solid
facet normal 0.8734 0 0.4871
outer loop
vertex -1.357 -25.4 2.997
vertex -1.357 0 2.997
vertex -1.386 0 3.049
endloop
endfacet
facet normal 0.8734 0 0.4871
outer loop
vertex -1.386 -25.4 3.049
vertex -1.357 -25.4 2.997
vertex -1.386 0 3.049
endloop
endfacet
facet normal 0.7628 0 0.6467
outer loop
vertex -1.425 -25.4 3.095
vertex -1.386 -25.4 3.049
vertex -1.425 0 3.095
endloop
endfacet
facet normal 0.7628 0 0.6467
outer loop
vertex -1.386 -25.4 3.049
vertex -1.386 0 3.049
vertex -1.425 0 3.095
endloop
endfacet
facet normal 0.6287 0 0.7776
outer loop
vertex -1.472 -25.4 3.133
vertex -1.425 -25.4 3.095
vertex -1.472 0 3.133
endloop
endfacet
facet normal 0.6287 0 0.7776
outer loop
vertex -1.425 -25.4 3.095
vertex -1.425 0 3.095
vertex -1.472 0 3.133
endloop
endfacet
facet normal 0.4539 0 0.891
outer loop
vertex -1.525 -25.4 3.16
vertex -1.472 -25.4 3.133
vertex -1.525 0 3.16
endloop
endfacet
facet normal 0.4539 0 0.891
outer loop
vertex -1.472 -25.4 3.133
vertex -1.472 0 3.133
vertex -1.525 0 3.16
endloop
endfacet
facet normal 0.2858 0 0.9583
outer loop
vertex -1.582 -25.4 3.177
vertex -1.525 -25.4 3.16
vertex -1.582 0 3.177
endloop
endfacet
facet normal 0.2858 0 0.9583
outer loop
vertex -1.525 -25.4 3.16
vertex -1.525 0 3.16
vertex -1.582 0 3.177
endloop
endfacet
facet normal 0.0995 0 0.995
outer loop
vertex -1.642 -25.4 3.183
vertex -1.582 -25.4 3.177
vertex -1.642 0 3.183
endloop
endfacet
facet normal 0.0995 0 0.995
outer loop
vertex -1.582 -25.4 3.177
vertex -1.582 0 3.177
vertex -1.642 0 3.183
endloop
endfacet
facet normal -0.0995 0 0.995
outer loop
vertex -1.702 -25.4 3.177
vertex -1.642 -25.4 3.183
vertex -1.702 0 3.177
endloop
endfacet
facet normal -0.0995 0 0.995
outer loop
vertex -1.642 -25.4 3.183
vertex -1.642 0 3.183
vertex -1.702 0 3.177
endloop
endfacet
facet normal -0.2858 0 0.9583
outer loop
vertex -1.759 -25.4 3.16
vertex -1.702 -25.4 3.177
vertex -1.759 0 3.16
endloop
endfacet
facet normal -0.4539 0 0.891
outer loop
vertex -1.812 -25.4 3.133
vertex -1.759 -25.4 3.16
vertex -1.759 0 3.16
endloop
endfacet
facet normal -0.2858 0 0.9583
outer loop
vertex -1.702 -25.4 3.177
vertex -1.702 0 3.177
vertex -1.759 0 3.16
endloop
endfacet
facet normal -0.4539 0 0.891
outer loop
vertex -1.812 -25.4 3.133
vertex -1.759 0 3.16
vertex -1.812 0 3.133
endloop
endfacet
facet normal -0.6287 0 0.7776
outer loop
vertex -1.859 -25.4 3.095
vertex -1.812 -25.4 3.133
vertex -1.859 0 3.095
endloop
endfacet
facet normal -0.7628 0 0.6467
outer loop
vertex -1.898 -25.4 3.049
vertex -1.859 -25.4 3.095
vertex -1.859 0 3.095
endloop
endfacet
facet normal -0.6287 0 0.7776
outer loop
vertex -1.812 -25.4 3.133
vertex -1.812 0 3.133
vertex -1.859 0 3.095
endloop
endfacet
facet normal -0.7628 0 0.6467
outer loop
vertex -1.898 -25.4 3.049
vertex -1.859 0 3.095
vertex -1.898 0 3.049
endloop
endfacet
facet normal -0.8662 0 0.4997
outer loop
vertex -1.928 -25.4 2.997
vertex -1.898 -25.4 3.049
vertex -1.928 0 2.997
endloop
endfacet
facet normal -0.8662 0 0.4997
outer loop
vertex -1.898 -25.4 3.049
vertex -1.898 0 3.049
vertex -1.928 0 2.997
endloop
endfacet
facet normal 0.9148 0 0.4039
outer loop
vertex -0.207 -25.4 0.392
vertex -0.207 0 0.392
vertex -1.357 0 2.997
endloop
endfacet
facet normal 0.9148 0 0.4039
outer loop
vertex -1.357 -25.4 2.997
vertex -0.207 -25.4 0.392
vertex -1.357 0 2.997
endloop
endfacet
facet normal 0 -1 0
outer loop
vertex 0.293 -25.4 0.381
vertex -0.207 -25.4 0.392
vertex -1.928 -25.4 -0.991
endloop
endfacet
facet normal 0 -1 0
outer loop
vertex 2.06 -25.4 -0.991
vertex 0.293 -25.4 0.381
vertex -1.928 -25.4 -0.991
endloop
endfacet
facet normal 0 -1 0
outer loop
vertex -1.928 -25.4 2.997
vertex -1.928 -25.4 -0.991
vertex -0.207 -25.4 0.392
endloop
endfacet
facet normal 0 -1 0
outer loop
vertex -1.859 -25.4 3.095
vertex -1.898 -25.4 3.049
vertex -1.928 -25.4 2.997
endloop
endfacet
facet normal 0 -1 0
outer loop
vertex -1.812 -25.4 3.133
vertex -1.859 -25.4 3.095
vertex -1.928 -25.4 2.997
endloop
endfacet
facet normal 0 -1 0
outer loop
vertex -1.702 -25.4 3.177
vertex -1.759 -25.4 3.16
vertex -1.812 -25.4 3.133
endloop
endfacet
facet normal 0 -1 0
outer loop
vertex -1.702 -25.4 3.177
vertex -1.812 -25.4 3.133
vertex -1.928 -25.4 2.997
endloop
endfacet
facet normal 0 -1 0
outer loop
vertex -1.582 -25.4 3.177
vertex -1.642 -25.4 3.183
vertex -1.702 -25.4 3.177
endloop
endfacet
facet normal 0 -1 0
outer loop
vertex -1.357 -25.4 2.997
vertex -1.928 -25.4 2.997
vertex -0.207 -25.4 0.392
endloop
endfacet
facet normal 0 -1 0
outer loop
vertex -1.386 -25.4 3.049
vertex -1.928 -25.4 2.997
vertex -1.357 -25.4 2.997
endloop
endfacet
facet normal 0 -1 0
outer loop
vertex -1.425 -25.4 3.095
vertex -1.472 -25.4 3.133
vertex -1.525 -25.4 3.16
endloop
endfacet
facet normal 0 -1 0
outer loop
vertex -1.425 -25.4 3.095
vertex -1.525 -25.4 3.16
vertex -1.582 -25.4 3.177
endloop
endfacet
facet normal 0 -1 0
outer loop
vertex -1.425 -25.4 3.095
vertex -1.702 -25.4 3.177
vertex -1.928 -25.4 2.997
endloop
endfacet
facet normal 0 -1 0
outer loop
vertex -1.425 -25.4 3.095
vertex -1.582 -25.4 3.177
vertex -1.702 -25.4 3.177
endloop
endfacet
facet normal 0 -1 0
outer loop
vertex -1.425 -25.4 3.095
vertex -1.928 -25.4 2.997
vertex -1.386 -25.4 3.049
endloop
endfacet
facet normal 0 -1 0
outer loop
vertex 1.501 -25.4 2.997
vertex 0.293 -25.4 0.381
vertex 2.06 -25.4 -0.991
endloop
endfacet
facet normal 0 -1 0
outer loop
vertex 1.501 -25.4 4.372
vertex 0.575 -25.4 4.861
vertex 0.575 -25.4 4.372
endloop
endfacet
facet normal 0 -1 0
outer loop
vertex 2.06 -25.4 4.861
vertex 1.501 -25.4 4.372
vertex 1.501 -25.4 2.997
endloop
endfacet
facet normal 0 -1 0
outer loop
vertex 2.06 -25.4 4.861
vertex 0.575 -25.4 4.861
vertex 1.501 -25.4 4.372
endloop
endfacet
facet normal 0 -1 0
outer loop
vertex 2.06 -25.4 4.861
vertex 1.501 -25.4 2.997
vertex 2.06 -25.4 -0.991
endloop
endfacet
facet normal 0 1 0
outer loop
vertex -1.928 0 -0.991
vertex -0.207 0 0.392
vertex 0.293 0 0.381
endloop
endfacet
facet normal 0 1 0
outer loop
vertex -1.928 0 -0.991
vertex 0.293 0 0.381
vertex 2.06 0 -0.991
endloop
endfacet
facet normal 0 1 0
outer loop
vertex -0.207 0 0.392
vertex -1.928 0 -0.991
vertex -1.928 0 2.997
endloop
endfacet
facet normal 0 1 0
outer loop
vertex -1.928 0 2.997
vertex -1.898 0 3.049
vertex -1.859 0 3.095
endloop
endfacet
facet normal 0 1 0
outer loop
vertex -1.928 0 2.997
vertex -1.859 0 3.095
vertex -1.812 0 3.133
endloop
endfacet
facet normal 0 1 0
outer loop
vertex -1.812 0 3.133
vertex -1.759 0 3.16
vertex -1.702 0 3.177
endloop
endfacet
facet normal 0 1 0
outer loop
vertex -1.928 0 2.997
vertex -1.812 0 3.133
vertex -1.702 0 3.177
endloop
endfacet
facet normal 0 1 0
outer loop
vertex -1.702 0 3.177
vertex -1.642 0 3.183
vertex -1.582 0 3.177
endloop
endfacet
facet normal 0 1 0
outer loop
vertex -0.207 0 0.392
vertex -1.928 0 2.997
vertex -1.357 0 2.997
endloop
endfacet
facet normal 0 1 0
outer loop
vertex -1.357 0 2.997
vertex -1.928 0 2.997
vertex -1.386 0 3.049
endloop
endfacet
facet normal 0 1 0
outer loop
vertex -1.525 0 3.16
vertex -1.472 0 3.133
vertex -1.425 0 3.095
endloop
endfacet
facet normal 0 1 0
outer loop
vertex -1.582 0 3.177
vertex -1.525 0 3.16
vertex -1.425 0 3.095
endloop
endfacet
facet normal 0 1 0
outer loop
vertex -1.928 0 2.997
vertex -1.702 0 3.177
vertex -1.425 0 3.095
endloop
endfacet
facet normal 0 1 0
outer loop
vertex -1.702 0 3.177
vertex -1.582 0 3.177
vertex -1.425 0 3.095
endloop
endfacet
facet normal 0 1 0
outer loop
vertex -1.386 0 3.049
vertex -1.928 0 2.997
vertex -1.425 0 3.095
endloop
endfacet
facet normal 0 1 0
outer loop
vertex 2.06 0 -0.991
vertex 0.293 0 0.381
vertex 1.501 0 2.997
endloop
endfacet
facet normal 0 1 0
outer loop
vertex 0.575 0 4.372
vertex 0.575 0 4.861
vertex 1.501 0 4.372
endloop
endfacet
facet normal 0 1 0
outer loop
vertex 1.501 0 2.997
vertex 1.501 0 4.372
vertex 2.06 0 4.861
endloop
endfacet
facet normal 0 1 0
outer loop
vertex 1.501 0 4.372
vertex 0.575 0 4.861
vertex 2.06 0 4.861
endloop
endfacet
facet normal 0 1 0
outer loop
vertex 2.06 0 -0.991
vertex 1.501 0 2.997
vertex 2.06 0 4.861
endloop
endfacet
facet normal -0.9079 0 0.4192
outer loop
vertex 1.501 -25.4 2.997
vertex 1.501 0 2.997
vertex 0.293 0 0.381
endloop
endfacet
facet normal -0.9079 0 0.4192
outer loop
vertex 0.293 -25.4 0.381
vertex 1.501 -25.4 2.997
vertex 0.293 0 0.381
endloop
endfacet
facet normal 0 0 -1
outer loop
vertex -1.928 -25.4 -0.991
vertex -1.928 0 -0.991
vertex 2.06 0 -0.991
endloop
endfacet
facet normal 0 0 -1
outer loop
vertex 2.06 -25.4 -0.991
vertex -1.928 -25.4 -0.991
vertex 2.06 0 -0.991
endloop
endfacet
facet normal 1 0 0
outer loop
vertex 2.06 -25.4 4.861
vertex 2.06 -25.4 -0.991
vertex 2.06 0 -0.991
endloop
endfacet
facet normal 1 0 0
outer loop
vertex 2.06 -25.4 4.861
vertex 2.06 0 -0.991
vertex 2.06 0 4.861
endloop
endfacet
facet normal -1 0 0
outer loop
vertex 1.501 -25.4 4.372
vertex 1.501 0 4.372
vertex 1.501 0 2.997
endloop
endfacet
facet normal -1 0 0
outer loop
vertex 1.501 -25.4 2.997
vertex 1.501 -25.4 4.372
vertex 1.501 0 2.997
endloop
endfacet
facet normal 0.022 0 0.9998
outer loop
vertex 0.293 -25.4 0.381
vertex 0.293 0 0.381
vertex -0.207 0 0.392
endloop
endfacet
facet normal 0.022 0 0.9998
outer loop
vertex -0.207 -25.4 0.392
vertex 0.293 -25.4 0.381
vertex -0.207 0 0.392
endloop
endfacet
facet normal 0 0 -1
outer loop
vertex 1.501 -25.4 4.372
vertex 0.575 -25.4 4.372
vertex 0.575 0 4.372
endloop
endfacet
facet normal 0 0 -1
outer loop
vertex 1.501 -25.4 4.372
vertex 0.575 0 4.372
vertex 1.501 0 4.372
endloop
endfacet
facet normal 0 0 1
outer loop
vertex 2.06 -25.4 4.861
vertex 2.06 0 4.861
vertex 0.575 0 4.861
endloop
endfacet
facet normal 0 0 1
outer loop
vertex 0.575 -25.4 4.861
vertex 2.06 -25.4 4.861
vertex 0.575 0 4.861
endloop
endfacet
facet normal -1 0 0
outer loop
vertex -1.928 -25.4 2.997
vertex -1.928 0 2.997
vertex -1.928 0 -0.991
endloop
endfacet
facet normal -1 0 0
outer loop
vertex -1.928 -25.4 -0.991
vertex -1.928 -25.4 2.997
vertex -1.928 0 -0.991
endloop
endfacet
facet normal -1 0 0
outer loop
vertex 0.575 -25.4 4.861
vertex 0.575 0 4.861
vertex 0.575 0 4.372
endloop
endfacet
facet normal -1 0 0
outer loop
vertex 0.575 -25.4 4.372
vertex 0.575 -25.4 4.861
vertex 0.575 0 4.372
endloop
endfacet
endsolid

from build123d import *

# Parameters (mm, degrees)
F1_DEPTH = 25.4


# Not quite as in the source:
# - a feature names something its author has since deleted; it is built from what else it names


with BuildPart() as f1:
    # F0 (on Front) → F1 (new body)
    with BuildSketch(Plane.XZ):
        with BuildLine():
            Line((-1.9275679621, -0.9906), (2.0602320379, -0.9906))
            Line((2.0602320379, -0.9906), (2.0602320379, 2.9972))
            ThreePointArc((2.0602320379, 2.9972), (1.7808320379, 3.1758966119), (1.5014320379, 2.9972))
            Line((1.5014320379, 2.9972), (0.2927852911, 0.381))
            Line((0.2927852911, 0.381), (-0.2070155831, 0.3918310395))
            Line((-0.2070155831, 0.3918310395), (-1.3567524399, 2.9972))
            ThreePointArc((-1.3567524399, 2.9972), (-1.642160201, 3.1832136759), (-1.9275679621, 2.9972))
            Line((-1.9275679621, 2.9972), (-1.9275679621, -0.9906))
        make_face()
        with BuildLine():
            ThreePointArc((1.5014320379, 2.9972), (1.7808320379, 3.1758966119), (2.0602320379, 2.9972))
            Line((2.0602320379, 2.9972), (2.0602320379, 4.8607838479))
            Line((2.0602320379, 4.8607838479), (0.575090351, 4.8607838479))
            Line((0.575090351, 4.8607838479), (0.575090351, 4.3721500923))
            Line((0.575090351, 4.3721500923), (1.5014320379, 4.3721500923))
            Line((1.5014320379, 4.3721500923), (1.5014320379, 2.9972))
        make_face()
    extrude(amount=F1_DEPTH)


solid = f1.part
